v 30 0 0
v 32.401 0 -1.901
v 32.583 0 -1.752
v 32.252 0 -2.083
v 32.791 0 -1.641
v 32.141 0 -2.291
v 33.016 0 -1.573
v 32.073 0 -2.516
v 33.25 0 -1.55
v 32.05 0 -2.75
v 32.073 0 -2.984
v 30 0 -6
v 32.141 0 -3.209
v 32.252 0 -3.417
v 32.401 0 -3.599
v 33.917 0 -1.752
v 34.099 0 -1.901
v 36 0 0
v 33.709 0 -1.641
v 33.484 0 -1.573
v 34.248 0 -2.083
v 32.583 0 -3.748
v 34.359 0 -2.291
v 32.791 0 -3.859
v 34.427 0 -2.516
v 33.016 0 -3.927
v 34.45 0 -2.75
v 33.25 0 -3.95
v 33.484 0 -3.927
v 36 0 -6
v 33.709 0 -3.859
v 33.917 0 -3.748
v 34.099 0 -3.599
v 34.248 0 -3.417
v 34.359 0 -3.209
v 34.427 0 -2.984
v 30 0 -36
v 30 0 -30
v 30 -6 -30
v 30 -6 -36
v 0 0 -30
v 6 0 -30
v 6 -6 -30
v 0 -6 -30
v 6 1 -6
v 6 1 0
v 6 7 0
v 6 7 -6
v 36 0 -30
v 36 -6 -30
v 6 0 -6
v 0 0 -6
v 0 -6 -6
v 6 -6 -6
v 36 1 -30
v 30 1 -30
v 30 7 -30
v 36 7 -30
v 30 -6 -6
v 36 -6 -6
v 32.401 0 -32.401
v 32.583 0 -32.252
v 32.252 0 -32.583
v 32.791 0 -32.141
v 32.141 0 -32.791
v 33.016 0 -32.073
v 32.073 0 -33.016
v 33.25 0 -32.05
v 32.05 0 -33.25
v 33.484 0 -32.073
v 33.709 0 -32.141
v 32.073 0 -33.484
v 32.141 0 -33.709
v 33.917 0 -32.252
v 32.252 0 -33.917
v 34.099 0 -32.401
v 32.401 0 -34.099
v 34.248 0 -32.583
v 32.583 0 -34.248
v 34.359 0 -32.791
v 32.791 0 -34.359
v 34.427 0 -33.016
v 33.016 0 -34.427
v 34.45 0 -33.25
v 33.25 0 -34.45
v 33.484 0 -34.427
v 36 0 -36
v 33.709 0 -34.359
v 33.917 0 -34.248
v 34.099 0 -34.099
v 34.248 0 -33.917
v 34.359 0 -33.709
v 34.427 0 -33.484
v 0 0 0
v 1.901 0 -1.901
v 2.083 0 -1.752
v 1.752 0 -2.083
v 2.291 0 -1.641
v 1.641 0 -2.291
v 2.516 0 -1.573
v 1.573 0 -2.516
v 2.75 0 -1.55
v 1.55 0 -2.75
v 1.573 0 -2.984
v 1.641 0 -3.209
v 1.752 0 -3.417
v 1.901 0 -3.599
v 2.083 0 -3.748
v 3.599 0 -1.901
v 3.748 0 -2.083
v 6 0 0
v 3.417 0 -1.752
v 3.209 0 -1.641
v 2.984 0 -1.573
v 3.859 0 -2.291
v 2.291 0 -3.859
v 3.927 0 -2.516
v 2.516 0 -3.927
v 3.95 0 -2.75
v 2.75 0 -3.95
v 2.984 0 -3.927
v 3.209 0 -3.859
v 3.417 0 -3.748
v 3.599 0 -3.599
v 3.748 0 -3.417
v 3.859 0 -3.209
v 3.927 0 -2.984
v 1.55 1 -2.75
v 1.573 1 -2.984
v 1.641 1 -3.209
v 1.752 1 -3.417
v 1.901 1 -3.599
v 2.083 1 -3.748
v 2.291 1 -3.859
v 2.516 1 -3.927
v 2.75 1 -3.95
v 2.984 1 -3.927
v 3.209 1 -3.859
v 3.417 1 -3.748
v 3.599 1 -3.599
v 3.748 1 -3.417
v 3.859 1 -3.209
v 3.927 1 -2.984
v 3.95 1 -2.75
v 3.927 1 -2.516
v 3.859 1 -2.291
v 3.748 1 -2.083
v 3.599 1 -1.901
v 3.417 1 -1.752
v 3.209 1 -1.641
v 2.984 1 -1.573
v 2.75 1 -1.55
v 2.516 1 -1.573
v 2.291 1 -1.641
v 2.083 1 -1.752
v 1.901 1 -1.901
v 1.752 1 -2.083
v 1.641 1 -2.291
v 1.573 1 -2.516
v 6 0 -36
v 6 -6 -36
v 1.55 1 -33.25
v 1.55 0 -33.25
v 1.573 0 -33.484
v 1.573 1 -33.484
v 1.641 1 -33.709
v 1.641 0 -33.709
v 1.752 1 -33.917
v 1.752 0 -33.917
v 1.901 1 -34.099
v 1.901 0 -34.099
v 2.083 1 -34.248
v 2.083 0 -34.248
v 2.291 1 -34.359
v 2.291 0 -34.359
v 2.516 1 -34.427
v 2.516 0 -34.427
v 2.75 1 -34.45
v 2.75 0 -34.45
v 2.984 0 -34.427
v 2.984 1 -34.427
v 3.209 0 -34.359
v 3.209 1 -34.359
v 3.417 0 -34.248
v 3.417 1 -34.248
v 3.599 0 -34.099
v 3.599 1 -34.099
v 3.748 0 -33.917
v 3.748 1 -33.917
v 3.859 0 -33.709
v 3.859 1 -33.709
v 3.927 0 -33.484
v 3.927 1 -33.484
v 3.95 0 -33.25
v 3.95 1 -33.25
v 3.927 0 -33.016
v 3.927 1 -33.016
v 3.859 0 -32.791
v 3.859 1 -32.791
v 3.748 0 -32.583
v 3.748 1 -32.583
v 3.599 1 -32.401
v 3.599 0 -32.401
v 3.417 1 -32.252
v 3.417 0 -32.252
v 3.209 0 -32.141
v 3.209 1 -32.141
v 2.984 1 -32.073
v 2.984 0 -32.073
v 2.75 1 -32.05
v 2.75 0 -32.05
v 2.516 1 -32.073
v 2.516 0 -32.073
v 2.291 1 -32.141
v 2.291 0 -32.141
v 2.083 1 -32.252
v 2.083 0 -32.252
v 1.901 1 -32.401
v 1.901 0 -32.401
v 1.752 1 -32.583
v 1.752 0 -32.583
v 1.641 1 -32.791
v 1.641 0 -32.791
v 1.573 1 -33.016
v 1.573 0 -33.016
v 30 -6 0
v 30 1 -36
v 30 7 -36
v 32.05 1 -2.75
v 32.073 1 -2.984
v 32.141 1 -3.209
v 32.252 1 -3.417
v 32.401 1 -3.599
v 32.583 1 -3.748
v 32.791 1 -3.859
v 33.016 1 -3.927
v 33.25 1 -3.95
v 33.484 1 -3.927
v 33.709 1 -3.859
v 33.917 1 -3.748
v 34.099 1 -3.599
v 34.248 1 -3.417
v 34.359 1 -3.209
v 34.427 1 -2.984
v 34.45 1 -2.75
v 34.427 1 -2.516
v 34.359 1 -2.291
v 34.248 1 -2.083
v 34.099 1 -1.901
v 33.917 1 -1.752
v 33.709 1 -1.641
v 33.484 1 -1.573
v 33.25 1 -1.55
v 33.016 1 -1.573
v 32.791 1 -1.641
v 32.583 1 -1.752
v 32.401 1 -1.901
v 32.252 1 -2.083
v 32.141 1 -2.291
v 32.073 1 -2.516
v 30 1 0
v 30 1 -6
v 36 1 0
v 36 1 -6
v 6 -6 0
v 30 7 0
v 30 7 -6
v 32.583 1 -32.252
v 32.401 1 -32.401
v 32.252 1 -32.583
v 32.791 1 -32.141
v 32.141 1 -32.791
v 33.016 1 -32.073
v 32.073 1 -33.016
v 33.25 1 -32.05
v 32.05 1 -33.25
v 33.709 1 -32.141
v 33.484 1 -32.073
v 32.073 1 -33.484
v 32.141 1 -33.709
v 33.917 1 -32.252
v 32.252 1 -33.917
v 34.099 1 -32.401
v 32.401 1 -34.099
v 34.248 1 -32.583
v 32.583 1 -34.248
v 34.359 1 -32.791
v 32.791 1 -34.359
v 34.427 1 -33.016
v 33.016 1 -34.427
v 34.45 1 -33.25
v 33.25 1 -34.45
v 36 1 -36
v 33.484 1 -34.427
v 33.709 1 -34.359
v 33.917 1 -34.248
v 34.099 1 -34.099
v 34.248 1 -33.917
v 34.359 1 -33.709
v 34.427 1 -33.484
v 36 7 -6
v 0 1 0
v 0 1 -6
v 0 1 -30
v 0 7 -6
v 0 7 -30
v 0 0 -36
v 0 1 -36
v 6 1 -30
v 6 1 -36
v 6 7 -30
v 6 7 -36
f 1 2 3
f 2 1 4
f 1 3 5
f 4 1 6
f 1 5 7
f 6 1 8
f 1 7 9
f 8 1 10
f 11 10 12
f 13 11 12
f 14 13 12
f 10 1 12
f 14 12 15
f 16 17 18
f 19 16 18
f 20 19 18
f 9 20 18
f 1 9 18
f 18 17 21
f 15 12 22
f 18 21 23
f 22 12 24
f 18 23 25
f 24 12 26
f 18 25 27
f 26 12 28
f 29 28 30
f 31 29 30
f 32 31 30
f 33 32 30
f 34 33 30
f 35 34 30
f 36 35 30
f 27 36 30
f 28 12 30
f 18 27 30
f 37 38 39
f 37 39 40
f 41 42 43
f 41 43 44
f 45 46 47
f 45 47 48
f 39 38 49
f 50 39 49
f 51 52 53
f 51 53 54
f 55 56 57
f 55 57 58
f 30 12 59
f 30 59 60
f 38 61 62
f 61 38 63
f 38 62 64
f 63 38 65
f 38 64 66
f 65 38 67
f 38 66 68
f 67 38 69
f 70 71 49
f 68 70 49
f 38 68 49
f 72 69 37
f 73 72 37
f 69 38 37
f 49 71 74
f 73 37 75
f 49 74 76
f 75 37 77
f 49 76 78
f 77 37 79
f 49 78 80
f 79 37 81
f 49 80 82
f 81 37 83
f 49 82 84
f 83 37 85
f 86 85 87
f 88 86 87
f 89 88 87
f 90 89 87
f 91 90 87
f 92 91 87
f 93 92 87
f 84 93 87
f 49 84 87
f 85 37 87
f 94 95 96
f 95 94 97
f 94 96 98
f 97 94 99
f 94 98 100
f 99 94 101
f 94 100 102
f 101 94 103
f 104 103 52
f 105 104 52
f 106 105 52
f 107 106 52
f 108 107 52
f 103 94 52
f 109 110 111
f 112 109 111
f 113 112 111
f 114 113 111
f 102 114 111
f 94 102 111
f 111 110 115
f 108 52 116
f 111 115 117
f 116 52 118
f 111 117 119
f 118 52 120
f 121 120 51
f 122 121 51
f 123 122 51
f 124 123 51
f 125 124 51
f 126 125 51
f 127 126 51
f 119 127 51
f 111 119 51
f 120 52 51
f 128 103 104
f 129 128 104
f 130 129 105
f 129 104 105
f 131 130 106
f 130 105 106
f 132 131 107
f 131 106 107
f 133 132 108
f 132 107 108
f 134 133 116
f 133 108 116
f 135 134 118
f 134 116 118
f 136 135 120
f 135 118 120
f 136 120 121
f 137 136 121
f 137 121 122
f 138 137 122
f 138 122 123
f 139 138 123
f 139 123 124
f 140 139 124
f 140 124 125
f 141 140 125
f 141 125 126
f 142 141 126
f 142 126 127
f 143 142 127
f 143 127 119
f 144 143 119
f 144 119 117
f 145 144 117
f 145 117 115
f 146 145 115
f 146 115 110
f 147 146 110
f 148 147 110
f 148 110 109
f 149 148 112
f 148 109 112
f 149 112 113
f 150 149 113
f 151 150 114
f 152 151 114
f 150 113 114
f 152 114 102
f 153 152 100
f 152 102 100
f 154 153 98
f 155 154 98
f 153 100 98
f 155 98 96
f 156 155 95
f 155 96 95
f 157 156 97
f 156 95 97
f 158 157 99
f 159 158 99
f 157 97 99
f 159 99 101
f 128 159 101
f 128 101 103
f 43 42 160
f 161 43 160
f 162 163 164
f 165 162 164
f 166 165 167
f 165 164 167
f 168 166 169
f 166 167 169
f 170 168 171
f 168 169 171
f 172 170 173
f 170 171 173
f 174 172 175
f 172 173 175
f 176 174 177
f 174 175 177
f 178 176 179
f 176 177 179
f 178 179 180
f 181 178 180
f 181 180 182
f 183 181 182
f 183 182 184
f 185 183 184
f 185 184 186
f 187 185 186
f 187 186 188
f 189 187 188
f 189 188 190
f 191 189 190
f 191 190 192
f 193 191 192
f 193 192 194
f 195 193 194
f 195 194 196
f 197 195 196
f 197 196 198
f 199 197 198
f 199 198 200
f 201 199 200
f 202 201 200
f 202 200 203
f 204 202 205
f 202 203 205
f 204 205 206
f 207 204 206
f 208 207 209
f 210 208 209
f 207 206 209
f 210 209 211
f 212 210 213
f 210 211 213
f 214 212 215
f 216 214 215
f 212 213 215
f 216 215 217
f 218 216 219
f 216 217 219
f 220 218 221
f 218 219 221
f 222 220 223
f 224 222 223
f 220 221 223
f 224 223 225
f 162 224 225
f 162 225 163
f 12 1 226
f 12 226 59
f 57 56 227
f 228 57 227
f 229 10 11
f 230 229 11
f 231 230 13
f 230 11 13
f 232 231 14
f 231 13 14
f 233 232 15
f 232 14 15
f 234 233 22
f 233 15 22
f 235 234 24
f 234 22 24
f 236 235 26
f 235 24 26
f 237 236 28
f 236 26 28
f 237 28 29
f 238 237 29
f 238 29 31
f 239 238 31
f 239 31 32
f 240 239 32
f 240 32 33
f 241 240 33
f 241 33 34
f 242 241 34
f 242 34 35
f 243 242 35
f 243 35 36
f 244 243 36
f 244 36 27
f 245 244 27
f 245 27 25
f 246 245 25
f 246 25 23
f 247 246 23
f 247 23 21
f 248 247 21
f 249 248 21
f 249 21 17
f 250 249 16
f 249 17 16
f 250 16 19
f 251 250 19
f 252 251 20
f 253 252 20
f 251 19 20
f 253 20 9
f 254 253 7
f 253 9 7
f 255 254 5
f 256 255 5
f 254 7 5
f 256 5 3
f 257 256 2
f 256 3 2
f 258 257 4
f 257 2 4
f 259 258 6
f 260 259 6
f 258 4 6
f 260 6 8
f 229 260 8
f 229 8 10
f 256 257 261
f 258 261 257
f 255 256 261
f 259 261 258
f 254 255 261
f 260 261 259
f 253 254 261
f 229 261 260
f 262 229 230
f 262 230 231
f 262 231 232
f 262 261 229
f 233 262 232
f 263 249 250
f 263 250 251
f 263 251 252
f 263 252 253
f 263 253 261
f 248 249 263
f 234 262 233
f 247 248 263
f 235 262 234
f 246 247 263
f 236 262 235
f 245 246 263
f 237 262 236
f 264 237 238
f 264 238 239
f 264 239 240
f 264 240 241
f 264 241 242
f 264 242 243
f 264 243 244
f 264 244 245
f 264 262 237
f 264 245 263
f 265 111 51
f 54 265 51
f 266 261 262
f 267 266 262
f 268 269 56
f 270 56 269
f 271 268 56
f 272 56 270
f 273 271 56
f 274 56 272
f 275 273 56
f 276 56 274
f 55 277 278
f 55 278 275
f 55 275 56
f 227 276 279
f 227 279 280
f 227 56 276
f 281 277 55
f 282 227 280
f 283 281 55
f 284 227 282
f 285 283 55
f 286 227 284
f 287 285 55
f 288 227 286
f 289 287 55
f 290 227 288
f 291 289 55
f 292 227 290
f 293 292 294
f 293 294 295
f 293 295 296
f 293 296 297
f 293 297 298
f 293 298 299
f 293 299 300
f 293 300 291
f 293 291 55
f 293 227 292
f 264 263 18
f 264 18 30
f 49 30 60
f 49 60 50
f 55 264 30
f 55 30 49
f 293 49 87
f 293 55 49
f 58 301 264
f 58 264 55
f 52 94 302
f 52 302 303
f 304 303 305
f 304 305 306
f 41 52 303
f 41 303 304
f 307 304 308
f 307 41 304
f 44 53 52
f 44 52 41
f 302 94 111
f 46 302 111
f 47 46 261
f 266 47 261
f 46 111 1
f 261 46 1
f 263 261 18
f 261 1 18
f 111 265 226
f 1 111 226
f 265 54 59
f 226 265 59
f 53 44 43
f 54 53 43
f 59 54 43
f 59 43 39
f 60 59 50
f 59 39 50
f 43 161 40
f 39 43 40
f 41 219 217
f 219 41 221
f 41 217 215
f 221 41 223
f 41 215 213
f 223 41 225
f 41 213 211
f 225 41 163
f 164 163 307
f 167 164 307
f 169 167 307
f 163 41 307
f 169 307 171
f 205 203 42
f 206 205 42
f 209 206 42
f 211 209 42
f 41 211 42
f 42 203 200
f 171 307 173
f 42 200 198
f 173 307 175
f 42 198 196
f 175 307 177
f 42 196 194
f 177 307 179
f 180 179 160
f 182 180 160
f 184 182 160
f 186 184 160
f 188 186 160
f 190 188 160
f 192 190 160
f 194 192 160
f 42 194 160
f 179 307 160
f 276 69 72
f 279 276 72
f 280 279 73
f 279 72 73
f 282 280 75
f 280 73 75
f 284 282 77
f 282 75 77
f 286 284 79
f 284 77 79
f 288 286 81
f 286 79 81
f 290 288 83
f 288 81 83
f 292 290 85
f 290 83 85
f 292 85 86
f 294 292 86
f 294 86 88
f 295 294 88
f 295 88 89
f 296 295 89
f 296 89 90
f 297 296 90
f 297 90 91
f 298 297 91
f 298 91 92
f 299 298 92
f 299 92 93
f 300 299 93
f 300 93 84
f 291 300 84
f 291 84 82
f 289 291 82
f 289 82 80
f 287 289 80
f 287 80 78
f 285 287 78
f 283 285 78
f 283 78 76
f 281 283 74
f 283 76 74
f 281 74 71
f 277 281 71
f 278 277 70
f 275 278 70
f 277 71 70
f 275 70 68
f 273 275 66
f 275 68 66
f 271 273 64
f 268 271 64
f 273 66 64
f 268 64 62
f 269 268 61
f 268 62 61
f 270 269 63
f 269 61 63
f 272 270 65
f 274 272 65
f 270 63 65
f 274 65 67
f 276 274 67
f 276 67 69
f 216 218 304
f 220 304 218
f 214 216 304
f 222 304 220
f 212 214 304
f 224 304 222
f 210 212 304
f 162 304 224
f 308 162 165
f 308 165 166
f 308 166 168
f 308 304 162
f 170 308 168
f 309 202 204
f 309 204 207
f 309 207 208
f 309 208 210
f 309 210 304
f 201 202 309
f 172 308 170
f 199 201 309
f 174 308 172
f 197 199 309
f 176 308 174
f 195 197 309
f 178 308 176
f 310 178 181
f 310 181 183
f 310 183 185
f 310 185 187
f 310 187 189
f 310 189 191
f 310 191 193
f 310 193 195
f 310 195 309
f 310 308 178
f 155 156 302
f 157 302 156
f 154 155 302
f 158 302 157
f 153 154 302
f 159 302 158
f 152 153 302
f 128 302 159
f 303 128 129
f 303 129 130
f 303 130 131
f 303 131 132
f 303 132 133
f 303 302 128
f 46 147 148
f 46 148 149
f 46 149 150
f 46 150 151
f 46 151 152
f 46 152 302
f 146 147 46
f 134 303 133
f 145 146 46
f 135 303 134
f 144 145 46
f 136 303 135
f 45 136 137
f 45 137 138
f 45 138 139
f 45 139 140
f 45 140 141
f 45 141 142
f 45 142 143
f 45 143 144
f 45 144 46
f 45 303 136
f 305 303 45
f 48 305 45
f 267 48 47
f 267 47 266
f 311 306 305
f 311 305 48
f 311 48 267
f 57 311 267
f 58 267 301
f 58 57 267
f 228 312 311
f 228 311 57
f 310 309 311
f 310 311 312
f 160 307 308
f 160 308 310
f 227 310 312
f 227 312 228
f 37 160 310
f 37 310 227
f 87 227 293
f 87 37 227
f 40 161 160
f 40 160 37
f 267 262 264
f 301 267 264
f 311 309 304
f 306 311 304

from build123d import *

# Parameters (mm, degrees)
ESQUISSE1_W             = 36
ESQUISSE1_H             = 36
BOSS_EXTRU_1_DEPTH      = 1
D_GAGEMENT_M21_D        = 2.4
ESQUISSE5_W             = 6
ESQUISSE5_H             = 24
ESQUISSE5_W_2           = 24
ESQUISSE5_H_2           = 6
BOSS_EXTRU_2_DEPTH      = 6
BOSS_EXTRU_2_DEPTH_BACK = 7


with BuildPart() as part:
    # Esquisse1 → Boss.-Extru.1 (new body)
    with BuildSketch(Plane(origin=(0, 0, 0), x_dir=(1, 0, 0), z_dir=(0, 1, 0))):
        with Locations((18, 18)):
            Rectangle(ESQUISSE1_W, ESQUISSE1_H)
    extrude(amount=BOSS_EXTRU_1_DEPTH)

    # Dégagement M21 (through all)
    with Locations(Plane(origin=(0, 1, 0), x_dir=(1, 0, 0), z_dir=(0, 1, 0))):
        with Locations((2.75, 2.75), (2.75, 33.25), (33.25, 33.25), (33.25, 2.75)):
            Hole(D_GAGEMENT_M21_D / 2)

    # Esquisse5 → Boss.-Extru.2 (add, two sides)
    with BuildSketch(Plane(origin=(0, 1, 0), x_dir=(1, 0, 0), z_dir=(0, 1, 0))) as boss_extru_2_sk:
        with Locations((3, 18)):
            Rectangle(ESQUISSE5_W, ESQUISSE5_H)
        with Locations((18, 18)):
            Rectangle(ESQUISSE5_W_2, ESQUISSE5_H)
        with Locations((18, 33)):
            Rectangle(ESQUISSE5_W_2, ESQUISSE5_H_2)
        with Locations((33, 18)):
            Rectangle(ESQUISSE5_W, ESQUISSE5_H)
        with Locations((18, 3)):
            Rectangle(ESQUISSE5_W_2, ESQUISSE5_H_2)
    extrude(amount=BOSS_EXTRU_2_DEPTH)
    extrude(boss_extru_2_sk.sketch, amount=-BOSS_EXTRU_2_DEPTH_BACK)


solid = part.part
